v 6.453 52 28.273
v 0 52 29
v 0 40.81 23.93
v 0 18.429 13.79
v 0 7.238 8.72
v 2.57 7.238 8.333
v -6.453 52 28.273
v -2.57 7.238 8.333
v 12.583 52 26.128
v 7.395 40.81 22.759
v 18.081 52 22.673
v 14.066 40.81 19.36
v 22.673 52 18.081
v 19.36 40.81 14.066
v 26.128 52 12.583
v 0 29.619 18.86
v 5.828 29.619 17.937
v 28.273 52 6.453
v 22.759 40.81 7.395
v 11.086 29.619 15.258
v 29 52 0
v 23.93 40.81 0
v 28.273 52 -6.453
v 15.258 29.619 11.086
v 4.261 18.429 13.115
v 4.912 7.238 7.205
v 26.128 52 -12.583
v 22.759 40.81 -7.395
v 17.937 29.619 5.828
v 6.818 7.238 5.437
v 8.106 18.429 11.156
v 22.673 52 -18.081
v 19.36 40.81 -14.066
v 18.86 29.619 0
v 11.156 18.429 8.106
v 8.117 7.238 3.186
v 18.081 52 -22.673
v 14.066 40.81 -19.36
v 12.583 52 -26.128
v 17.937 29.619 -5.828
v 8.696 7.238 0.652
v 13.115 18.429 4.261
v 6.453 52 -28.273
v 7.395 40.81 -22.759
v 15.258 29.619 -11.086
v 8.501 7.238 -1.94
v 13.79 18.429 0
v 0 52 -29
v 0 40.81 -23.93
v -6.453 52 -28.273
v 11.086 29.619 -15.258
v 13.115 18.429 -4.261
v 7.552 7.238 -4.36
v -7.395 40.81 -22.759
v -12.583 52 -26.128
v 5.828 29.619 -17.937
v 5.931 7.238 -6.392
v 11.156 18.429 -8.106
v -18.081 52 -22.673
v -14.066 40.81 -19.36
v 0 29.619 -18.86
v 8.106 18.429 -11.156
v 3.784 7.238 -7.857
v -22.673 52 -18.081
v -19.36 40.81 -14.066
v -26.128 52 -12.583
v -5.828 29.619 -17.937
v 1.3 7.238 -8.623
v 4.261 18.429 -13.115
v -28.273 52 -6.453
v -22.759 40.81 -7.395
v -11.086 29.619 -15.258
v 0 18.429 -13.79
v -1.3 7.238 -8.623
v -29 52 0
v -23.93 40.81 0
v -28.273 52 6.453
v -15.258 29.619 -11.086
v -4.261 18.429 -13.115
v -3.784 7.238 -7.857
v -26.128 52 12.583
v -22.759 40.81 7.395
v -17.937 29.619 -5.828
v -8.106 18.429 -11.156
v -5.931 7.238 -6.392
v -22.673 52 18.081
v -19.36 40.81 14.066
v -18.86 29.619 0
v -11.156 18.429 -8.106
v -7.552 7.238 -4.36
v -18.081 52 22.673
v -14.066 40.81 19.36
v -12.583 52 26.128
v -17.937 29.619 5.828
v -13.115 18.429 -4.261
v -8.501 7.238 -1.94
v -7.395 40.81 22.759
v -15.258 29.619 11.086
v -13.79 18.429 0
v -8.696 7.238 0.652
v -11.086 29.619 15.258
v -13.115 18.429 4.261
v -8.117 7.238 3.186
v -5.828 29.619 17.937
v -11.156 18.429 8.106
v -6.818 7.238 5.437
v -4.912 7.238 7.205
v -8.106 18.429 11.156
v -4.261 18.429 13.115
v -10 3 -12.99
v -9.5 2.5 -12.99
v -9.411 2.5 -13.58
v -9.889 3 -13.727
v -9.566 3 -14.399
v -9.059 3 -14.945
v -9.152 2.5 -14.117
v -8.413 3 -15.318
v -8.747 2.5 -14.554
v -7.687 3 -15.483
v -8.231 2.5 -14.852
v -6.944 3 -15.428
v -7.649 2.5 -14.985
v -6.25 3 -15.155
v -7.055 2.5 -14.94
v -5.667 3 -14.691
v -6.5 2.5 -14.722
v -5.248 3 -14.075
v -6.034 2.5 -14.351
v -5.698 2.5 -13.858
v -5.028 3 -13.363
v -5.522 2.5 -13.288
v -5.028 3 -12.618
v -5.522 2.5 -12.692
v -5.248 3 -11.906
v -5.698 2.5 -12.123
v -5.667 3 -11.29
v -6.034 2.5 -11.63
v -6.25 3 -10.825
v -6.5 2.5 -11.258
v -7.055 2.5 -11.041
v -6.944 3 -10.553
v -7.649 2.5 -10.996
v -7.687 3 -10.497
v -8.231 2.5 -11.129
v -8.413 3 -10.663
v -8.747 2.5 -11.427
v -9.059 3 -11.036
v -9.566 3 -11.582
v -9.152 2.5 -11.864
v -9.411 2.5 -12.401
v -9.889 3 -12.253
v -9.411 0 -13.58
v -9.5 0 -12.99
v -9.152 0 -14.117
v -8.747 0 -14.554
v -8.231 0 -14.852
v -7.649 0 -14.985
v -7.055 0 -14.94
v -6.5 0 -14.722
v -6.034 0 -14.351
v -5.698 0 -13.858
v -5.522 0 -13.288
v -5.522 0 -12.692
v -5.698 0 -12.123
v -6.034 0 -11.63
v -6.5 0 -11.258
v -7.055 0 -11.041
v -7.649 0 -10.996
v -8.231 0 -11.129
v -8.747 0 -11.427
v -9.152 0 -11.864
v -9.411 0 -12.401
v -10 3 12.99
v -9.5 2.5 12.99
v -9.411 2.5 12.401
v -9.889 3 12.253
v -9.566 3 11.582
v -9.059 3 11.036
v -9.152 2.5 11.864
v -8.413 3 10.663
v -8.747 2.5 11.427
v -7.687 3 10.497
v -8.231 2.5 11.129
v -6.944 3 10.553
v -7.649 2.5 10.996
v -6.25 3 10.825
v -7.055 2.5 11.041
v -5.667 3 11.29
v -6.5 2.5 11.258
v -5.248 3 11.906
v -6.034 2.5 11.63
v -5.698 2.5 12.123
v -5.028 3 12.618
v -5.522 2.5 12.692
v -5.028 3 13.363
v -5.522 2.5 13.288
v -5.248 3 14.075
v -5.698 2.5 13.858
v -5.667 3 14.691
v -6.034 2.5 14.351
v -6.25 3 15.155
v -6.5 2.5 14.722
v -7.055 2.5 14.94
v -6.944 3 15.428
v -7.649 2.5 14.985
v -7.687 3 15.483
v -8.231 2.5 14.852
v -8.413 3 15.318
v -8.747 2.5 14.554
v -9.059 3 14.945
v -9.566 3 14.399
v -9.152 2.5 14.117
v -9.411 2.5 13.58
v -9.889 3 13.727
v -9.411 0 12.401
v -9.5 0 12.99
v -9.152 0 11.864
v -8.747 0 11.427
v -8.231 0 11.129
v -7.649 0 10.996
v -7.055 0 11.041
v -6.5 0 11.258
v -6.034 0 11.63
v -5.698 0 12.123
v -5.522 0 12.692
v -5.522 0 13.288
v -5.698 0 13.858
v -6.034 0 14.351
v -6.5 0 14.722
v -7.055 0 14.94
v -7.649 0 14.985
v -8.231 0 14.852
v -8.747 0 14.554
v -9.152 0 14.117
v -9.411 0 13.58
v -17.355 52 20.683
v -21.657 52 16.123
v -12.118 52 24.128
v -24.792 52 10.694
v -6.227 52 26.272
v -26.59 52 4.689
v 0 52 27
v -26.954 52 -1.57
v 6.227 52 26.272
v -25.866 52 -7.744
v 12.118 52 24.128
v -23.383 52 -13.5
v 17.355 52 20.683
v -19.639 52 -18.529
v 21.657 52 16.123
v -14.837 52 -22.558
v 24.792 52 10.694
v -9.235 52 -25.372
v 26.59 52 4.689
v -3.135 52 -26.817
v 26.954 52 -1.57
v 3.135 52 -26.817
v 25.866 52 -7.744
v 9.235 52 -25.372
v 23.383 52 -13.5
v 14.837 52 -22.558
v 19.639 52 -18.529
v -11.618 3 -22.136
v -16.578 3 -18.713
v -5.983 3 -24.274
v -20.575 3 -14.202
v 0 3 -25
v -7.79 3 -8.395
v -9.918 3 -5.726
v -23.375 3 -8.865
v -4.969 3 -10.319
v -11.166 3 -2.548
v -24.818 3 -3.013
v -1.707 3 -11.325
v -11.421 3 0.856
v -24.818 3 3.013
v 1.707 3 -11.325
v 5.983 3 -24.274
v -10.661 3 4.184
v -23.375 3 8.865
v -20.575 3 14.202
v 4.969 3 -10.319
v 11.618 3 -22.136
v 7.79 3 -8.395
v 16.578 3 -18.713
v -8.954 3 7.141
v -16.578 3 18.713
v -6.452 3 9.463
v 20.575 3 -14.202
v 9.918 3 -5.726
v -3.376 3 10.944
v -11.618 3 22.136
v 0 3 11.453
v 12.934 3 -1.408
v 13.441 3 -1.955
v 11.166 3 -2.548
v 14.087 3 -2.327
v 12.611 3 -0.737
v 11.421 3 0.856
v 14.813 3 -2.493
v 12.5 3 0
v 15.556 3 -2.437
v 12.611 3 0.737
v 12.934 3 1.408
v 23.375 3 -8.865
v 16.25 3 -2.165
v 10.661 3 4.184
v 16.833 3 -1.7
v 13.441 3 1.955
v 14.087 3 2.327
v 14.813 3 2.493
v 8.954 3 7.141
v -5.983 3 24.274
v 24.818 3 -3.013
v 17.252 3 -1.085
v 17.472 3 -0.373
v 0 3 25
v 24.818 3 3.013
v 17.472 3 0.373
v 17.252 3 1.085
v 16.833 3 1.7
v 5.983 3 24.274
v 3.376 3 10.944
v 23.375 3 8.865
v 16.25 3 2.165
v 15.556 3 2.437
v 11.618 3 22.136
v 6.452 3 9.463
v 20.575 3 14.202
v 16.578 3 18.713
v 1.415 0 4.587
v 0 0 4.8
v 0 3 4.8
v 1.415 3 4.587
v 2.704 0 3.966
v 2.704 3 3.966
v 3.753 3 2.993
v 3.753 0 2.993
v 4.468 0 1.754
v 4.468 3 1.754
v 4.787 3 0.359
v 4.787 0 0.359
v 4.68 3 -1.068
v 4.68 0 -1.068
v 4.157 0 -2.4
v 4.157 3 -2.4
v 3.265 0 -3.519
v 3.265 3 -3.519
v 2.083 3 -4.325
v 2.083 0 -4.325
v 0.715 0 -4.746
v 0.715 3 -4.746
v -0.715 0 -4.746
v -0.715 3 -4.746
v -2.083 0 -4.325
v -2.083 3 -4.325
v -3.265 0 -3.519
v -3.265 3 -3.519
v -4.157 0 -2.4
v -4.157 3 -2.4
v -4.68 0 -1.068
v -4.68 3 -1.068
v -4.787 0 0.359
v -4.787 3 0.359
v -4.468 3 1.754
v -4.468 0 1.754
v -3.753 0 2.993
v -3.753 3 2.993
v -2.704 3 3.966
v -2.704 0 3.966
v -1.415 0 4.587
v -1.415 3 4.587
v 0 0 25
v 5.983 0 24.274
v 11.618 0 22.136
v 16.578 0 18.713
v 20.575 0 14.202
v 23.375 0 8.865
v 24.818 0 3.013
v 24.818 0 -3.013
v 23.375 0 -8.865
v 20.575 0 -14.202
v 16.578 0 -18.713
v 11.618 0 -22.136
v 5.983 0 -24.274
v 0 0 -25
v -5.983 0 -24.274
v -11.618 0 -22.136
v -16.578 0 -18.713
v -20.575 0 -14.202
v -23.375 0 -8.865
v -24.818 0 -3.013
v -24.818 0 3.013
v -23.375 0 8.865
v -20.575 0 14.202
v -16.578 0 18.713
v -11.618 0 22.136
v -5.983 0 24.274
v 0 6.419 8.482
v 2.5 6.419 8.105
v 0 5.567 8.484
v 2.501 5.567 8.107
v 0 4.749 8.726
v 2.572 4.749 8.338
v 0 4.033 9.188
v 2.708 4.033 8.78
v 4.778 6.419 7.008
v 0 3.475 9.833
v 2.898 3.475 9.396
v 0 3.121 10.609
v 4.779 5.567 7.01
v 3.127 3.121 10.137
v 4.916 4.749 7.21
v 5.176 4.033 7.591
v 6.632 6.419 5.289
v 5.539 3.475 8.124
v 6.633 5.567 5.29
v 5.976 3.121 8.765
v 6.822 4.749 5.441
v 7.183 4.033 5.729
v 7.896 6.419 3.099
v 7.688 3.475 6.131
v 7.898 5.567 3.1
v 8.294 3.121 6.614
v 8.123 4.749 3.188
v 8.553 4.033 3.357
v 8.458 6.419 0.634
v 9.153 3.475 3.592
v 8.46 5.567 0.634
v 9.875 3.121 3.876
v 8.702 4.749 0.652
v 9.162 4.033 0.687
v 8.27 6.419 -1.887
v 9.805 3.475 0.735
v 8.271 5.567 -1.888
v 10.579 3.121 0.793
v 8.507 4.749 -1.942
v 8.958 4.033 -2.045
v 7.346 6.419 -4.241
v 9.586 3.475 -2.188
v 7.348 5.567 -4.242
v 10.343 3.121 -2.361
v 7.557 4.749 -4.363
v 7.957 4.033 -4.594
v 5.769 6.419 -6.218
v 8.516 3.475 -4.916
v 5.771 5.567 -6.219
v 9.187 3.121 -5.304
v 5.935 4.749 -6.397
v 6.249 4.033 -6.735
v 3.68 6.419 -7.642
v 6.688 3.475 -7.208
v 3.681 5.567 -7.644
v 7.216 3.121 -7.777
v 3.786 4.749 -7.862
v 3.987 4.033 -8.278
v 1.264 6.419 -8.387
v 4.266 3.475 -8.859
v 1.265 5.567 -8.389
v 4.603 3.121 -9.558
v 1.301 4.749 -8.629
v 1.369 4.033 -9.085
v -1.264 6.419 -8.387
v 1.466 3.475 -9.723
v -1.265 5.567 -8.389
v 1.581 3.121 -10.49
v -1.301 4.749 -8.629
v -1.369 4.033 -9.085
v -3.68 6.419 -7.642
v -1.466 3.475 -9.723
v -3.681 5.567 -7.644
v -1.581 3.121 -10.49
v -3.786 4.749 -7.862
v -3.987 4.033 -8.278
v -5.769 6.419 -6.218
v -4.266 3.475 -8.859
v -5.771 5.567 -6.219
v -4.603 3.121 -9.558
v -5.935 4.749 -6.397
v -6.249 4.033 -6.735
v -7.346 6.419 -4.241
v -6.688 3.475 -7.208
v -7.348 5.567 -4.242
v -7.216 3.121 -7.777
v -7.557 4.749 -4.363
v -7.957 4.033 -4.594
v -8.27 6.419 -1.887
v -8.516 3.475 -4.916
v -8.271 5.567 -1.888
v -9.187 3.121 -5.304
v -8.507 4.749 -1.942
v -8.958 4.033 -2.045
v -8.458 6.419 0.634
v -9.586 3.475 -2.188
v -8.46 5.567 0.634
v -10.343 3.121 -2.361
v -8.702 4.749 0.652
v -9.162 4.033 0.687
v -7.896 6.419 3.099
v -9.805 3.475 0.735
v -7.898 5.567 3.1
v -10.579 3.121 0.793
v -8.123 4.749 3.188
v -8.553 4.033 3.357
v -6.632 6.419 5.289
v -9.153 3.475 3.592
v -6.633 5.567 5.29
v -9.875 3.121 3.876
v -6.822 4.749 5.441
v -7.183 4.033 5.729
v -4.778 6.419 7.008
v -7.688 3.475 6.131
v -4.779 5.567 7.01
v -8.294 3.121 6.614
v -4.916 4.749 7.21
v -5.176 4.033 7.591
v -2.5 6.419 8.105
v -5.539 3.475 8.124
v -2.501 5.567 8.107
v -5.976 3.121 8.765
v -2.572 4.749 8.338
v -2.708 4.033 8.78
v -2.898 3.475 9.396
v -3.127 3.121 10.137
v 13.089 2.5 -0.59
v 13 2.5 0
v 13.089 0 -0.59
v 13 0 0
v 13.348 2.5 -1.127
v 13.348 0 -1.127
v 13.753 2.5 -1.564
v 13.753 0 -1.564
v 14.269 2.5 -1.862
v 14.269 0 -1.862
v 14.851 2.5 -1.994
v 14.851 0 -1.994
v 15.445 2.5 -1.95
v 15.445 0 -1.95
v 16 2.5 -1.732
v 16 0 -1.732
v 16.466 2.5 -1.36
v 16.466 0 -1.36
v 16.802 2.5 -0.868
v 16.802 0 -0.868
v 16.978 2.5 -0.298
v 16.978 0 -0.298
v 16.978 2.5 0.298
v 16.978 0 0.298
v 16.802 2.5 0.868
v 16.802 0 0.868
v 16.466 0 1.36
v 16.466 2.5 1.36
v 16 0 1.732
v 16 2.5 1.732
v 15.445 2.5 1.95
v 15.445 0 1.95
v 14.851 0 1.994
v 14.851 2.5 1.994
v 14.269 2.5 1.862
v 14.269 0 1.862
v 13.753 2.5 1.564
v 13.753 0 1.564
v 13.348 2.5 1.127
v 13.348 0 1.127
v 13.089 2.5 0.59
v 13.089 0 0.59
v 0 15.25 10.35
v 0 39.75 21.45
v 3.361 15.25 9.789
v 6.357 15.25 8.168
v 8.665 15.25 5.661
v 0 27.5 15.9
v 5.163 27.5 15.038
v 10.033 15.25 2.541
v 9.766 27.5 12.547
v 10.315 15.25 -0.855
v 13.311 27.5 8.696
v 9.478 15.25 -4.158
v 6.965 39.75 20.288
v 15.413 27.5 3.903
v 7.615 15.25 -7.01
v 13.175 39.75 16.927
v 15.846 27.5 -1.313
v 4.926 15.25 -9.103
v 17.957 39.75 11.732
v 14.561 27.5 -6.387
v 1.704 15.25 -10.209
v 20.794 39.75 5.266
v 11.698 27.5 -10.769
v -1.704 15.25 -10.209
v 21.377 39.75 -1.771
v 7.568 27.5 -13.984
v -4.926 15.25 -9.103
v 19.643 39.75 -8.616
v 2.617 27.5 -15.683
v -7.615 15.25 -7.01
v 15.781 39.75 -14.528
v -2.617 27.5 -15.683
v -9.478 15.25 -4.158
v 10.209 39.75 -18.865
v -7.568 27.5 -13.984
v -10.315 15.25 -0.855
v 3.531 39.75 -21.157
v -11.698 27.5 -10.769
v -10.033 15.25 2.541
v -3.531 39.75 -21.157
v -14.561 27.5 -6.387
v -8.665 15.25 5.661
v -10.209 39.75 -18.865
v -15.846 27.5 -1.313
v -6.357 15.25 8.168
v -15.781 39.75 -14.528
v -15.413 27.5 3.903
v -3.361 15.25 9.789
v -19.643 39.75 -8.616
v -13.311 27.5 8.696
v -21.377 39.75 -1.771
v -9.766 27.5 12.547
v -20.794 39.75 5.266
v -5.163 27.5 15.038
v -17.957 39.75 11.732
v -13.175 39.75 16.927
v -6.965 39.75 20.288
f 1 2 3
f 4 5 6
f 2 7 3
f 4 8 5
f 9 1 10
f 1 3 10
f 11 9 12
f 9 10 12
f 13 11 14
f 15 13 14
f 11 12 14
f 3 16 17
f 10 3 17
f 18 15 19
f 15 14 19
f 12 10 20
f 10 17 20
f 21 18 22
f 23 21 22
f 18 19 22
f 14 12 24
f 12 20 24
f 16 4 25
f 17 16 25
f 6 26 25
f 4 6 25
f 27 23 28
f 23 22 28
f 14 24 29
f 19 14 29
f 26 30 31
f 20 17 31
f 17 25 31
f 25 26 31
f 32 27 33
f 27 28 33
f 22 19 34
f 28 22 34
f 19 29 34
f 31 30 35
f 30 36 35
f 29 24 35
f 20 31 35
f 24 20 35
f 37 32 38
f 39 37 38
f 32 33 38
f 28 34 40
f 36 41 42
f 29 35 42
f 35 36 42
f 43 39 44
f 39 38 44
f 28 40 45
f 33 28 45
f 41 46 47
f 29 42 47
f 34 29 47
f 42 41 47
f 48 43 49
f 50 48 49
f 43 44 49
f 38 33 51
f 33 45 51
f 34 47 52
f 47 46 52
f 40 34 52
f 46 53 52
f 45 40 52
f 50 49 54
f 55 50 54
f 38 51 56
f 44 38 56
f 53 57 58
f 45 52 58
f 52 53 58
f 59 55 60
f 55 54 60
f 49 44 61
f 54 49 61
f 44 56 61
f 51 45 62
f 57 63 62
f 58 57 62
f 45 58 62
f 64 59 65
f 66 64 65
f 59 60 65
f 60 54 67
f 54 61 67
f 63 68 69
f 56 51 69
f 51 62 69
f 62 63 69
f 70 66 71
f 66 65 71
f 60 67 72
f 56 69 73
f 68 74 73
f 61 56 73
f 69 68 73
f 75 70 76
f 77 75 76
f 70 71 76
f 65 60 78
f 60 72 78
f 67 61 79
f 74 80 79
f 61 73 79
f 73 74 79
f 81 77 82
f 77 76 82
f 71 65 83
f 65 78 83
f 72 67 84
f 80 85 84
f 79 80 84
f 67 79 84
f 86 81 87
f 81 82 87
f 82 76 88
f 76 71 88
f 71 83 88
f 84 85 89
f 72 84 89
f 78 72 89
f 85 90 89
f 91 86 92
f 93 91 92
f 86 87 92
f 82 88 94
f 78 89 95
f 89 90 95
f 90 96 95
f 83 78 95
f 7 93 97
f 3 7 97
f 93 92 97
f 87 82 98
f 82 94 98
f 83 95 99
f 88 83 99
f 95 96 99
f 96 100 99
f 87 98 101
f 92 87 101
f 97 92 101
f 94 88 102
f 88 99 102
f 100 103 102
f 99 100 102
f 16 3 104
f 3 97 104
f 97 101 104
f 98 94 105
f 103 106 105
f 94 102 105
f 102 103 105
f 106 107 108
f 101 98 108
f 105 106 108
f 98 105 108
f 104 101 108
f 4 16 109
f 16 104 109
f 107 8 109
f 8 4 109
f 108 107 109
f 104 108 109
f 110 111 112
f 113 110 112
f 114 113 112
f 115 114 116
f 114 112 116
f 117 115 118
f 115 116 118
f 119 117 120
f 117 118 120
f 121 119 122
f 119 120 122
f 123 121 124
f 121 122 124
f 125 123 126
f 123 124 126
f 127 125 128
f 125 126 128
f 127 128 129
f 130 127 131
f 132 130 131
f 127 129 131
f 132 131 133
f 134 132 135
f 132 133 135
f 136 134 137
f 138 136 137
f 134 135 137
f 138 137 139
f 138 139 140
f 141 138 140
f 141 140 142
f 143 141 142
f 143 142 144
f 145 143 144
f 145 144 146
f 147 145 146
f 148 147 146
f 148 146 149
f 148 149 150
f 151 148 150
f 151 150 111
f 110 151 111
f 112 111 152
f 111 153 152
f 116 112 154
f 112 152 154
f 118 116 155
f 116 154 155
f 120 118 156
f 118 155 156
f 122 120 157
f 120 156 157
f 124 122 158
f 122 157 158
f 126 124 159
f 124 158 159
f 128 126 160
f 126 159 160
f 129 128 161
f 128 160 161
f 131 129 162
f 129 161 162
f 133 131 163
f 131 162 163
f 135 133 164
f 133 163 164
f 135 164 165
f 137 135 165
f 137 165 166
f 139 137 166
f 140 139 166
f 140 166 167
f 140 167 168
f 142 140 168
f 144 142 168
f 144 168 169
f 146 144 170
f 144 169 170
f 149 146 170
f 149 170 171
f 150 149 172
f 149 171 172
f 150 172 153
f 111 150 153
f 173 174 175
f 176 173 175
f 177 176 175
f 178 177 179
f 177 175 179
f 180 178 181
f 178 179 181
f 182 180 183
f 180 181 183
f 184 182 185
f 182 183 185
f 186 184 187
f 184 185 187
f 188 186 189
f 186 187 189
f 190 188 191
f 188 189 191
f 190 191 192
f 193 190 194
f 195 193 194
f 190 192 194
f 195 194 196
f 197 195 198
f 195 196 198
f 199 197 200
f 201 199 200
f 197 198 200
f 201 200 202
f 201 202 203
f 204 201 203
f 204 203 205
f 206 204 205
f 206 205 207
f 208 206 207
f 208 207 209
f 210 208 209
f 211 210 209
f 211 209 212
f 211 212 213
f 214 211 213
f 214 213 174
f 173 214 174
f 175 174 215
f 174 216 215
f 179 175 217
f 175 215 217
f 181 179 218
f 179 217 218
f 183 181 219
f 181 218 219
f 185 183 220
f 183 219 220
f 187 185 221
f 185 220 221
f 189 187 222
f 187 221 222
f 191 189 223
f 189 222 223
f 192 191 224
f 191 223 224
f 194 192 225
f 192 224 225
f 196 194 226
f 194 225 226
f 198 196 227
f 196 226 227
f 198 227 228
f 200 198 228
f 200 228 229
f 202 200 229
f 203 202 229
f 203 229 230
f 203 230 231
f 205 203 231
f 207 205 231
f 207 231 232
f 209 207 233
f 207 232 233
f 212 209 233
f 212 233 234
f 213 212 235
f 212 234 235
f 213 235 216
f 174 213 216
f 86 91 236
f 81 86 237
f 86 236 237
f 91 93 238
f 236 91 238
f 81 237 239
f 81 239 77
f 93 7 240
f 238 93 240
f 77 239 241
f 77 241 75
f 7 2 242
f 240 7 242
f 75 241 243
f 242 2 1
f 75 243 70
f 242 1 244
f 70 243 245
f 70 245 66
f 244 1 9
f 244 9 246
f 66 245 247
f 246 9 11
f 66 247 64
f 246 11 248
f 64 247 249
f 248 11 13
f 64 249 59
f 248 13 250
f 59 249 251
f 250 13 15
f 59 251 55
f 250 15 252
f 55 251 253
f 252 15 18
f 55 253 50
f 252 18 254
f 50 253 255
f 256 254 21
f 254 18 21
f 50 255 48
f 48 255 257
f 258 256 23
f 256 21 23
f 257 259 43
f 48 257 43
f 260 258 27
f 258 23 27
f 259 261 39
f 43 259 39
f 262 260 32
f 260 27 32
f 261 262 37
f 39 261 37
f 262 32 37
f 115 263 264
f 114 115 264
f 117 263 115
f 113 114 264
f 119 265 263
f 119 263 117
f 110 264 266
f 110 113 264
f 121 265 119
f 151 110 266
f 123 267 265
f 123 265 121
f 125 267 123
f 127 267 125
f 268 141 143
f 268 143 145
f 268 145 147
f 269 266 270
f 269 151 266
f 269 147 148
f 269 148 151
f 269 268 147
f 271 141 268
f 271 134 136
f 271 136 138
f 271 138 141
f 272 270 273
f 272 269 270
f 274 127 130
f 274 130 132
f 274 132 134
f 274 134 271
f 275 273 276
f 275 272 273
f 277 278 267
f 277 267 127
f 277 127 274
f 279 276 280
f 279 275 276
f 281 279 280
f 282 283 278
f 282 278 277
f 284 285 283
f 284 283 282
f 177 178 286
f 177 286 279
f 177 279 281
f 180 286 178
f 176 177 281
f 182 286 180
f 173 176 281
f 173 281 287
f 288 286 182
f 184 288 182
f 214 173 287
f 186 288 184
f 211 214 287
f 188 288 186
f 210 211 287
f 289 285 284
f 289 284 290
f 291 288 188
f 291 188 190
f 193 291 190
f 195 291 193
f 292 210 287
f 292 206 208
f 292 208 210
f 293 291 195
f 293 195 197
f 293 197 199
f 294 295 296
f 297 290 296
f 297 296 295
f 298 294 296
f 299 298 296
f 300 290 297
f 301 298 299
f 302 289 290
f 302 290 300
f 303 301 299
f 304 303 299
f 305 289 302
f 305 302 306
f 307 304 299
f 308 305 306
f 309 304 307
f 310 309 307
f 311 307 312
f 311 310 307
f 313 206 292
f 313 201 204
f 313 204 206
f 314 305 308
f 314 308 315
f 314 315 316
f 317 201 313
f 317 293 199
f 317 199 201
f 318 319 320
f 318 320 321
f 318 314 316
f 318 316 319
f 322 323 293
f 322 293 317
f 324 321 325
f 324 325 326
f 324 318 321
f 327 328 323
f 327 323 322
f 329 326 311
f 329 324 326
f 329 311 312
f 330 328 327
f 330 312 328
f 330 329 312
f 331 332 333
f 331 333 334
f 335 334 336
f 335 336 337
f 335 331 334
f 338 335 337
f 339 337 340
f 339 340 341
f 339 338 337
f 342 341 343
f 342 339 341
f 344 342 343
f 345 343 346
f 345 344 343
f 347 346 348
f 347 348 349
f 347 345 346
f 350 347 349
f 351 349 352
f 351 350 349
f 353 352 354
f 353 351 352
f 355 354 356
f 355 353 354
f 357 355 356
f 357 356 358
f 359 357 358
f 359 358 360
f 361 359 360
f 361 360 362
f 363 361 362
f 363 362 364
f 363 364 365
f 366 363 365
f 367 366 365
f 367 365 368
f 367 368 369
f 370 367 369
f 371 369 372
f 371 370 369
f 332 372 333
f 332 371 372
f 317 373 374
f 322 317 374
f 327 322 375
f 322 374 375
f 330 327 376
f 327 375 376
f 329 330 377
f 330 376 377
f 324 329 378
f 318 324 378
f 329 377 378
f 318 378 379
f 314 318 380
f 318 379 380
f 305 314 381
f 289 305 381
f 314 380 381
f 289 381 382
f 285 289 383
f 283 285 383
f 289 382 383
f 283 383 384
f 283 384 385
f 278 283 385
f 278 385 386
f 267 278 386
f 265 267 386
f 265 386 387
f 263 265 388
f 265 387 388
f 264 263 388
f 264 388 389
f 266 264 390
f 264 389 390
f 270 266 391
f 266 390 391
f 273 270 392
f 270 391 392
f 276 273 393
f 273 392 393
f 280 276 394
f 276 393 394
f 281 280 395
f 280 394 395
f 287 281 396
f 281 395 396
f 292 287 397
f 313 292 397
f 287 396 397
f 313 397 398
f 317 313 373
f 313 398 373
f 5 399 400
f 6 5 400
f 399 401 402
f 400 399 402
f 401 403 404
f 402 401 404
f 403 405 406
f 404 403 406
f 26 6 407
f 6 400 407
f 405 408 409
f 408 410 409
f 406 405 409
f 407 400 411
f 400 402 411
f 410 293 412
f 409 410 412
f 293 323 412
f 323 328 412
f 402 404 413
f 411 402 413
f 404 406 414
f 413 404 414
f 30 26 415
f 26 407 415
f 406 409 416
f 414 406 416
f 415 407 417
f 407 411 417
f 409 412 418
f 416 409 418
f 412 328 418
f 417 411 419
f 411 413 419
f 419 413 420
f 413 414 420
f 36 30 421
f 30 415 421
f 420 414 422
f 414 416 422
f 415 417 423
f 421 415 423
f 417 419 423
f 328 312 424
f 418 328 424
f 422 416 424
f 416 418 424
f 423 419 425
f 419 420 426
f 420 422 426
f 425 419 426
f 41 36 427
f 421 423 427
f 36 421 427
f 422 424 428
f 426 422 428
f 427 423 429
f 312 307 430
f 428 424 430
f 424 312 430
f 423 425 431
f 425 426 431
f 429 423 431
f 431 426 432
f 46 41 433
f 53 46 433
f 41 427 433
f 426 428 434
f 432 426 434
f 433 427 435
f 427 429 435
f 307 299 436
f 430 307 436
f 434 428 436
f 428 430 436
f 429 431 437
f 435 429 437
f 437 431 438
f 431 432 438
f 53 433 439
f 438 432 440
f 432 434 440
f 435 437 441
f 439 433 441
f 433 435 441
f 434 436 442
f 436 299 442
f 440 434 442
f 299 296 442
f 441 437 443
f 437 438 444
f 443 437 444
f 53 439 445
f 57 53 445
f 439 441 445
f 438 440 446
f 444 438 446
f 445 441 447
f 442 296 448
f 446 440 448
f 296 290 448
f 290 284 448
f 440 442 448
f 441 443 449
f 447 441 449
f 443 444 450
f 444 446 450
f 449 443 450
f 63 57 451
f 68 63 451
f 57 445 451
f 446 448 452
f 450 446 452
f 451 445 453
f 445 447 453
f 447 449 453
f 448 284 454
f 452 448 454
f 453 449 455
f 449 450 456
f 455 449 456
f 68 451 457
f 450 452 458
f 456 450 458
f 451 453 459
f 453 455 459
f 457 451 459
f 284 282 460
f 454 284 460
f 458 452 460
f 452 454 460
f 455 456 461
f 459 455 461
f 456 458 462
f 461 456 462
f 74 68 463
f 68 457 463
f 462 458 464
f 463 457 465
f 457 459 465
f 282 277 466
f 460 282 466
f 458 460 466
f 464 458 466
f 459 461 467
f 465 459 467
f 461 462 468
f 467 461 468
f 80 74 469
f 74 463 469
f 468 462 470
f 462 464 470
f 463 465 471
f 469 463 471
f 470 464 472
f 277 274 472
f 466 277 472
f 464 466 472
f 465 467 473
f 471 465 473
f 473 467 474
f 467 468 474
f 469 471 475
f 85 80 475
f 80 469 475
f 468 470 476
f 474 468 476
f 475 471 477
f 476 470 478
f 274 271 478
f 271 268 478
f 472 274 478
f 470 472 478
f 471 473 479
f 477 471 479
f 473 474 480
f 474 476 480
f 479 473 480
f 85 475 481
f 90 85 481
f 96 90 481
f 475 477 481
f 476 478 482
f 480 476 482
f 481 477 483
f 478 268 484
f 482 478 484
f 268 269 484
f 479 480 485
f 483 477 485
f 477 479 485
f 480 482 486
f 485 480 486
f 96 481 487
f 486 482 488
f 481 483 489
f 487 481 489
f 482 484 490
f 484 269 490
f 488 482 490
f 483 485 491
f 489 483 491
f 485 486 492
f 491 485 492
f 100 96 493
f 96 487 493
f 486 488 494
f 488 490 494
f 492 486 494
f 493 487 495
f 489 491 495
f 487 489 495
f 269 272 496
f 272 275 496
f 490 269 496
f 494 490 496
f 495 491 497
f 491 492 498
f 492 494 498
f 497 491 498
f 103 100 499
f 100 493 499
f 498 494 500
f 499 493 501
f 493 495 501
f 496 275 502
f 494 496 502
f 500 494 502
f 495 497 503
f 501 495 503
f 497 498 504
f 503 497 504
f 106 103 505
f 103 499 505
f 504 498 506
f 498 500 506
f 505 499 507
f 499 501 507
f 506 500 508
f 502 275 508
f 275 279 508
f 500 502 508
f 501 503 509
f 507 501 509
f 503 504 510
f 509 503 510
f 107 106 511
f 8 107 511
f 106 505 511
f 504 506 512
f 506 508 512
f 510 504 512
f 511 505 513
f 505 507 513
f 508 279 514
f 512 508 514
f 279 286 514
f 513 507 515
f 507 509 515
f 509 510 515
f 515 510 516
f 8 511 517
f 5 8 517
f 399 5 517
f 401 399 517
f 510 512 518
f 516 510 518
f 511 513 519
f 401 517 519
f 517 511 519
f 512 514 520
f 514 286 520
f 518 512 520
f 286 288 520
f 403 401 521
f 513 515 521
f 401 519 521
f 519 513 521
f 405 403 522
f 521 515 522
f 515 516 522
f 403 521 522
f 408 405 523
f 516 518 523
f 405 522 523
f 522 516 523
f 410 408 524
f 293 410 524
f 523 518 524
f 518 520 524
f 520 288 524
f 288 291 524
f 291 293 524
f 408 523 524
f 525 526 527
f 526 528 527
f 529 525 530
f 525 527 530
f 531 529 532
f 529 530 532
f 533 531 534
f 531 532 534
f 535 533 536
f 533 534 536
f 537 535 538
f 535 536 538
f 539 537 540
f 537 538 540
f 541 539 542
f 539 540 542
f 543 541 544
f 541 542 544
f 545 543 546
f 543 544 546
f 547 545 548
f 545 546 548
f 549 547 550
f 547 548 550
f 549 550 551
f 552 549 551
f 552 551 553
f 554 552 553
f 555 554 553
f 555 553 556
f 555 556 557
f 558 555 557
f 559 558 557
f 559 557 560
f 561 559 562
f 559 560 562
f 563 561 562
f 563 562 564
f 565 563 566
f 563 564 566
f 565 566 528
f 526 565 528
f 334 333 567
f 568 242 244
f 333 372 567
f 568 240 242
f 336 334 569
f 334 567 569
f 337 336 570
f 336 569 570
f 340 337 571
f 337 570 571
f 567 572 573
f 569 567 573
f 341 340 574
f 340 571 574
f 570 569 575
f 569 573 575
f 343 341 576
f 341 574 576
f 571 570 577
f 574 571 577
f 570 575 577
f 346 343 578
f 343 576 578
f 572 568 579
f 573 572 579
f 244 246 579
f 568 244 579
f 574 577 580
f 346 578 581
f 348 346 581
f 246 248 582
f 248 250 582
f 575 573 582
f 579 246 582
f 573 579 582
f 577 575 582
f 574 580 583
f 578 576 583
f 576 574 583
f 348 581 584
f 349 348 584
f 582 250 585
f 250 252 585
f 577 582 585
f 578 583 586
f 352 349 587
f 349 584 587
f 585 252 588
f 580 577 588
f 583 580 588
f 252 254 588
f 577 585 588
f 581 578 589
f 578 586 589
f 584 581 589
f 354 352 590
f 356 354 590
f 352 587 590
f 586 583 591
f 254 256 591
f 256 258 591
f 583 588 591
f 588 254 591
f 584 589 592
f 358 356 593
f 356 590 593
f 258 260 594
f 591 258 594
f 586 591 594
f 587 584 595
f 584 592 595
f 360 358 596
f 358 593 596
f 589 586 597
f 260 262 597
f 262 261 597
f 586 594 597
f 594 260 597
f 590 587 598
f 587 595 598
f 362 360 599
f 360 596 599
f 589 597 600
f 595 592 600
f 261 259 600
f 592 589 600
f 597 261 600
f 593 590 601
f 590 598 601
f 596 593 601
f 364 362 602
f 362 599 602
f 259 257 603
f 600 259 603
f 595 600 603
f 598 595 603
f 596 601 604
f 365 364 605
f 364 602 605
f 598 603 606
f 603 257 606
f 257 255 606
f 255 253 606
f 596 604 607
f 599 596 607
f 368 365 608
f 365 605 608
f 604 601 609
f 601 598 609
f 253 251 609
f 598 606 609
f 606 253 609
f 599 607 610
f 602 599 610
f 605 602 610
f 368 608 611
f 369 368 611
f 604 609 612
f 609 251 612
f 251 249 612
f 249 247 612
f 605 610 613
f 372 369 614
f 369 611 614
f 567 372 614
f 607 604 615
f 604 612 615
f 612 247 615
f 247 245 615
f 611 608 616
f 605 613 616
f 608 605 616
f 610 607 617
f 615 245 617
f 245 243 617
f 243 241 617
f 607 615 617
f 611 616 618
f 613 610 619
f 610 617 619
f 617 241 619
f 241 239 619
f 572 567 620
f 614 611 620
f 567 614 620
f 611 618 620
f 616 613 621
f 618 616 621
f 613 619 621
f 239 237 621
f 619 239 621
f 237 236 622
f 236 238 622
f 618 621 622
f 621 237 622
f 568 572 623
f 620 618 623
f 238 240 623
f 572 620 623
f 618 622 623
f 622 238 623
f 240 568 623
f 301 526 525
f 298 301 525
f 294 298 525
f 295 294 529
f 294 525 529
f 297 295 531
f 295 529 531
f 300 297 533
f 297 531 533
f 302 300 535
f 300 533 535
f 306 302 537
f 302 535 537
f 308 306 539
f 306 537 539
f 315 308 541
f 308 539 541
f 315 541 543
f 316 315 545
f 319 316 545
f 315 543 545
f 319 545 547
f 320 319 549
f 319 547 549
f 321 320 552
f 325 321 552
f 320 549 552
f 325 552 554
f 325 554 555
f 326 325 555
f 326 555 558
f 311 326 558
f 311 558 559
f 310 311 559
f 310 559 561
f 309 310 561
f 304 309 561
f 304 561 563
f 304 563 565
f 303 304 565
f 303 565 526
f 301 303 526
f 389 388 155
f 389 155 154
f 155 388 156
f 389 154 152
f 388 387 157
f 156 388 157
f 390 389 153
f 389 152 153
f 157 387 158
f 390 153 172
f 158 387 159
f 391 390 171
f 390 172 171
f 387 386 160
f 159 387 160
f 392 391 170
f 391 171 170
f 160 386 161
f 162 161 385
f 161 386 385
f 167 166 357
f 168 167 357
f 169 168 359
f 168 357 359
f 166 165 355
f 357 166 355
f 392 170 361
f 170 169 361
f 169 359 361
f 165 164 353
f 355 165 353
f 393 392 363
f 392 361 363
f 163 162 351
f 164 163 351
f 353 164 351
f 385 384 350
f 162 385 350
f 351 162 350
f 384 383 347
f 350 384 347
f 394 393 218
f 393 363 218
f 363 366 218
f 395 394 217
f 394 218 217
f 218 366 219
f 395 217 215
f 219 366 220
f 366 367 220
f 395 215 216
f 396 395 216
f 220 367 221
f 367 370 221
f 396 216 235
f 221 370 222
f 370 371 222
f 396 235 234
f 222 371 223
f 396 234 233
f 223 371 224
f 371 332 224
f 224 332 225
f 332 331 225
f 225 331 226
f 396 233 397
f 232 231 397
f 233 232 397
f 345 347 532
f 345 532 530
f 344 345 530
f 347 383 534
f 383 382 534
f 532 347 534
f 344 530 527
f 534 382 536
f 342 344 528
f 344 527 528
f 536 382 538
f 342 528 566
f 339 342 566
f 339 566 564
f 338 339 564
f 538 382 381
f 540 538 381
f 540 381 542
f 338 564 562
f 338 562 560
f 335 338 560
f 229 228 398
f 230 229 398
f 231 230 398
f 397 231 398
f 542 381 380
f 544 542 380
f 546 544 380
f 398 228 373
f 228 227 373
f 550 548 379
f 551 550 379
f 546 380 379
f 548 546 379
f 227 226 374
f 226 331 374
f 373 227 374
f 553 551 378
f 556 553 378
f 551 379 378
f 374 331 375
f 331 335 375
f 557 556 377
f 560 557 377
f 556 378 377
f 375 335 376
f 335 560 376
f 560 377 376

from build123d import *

# Parameters (mm, degrees)
SKETCH1_R                          = 25
SKETCH1_R_2                        = 4.8
BOSS_EXTRUDE1_DEPTH                = 3
F_4_0_4_DIAMETER_HOLE1_D           = 4
F_4_0_4_DIAMETER_HOLE1_CSINK_D     = 5
F_4_0_4_DIAMETER_HOLE1_CSINK_ANGLE = 90
FILLET2_R                          = 3


with BuildPart() as part:
    # Sketch1 → Boss-Extrude1 (new body)
    with BuildSketch(Plane(origin=(0, 0, 0), x_dir=(1, 0, 0), z_dir=(0, 1, 0))):
        with Locations(Location((0, 0, 0), (0, 0, 270))):
            Circle(SKETCH1_R)
        with Locations(Location((0, 0, 0), (0, 0, 270))):
            Circle(SKETCH1_R_2, mode=Mode.SUBTRACT)
    extrude(amount=BOSS_EXTRUDE1_DEPTH)

    # Ø4.0 (4) Diameter Hole1 (through all)
    with Locations(Plane(origin=(0, 3, 0), x_dir=(1, 0, 0), z_dir=(0, 1, 0))):
        with Locations((-7.5, 12.990381057), (15, 0), (-7.5, -12.990381057)):
            CounterSinkHole(F_4_0_4_DIAMETER_HOLE1_D / 2, F_4_0_4_DIAMETER_HOLE1_CSINK_D / 2, counter_sink_angle=F_4_0_4_DIAMETER_HOLE1_CSINK_ANGLE)

    # Sketch8 → Revolve1 (revolve)
    with BuildSketch(Plane.XY, mode=Mode.PRIVATE) as revolve1_sk:
        Polygon((27, 52), (29, 52), (6.8, 3), (4.8, 3), align=None)
    revolve(revolve1_sk.sketch.rotate(Axis((0, 0, 0), (0, 1, 0)), 270), axis=Axis((0, 0, 0), (0, 1, 0)))

    # Fillet2
    fillet2_edges = [part.edges().sort_by_distance(p)[0] for p in [
        (0, 3, -6.8),
    ]]
    fillet(fillet2_edges, radius=FILLET2_R)


solid = part.part
